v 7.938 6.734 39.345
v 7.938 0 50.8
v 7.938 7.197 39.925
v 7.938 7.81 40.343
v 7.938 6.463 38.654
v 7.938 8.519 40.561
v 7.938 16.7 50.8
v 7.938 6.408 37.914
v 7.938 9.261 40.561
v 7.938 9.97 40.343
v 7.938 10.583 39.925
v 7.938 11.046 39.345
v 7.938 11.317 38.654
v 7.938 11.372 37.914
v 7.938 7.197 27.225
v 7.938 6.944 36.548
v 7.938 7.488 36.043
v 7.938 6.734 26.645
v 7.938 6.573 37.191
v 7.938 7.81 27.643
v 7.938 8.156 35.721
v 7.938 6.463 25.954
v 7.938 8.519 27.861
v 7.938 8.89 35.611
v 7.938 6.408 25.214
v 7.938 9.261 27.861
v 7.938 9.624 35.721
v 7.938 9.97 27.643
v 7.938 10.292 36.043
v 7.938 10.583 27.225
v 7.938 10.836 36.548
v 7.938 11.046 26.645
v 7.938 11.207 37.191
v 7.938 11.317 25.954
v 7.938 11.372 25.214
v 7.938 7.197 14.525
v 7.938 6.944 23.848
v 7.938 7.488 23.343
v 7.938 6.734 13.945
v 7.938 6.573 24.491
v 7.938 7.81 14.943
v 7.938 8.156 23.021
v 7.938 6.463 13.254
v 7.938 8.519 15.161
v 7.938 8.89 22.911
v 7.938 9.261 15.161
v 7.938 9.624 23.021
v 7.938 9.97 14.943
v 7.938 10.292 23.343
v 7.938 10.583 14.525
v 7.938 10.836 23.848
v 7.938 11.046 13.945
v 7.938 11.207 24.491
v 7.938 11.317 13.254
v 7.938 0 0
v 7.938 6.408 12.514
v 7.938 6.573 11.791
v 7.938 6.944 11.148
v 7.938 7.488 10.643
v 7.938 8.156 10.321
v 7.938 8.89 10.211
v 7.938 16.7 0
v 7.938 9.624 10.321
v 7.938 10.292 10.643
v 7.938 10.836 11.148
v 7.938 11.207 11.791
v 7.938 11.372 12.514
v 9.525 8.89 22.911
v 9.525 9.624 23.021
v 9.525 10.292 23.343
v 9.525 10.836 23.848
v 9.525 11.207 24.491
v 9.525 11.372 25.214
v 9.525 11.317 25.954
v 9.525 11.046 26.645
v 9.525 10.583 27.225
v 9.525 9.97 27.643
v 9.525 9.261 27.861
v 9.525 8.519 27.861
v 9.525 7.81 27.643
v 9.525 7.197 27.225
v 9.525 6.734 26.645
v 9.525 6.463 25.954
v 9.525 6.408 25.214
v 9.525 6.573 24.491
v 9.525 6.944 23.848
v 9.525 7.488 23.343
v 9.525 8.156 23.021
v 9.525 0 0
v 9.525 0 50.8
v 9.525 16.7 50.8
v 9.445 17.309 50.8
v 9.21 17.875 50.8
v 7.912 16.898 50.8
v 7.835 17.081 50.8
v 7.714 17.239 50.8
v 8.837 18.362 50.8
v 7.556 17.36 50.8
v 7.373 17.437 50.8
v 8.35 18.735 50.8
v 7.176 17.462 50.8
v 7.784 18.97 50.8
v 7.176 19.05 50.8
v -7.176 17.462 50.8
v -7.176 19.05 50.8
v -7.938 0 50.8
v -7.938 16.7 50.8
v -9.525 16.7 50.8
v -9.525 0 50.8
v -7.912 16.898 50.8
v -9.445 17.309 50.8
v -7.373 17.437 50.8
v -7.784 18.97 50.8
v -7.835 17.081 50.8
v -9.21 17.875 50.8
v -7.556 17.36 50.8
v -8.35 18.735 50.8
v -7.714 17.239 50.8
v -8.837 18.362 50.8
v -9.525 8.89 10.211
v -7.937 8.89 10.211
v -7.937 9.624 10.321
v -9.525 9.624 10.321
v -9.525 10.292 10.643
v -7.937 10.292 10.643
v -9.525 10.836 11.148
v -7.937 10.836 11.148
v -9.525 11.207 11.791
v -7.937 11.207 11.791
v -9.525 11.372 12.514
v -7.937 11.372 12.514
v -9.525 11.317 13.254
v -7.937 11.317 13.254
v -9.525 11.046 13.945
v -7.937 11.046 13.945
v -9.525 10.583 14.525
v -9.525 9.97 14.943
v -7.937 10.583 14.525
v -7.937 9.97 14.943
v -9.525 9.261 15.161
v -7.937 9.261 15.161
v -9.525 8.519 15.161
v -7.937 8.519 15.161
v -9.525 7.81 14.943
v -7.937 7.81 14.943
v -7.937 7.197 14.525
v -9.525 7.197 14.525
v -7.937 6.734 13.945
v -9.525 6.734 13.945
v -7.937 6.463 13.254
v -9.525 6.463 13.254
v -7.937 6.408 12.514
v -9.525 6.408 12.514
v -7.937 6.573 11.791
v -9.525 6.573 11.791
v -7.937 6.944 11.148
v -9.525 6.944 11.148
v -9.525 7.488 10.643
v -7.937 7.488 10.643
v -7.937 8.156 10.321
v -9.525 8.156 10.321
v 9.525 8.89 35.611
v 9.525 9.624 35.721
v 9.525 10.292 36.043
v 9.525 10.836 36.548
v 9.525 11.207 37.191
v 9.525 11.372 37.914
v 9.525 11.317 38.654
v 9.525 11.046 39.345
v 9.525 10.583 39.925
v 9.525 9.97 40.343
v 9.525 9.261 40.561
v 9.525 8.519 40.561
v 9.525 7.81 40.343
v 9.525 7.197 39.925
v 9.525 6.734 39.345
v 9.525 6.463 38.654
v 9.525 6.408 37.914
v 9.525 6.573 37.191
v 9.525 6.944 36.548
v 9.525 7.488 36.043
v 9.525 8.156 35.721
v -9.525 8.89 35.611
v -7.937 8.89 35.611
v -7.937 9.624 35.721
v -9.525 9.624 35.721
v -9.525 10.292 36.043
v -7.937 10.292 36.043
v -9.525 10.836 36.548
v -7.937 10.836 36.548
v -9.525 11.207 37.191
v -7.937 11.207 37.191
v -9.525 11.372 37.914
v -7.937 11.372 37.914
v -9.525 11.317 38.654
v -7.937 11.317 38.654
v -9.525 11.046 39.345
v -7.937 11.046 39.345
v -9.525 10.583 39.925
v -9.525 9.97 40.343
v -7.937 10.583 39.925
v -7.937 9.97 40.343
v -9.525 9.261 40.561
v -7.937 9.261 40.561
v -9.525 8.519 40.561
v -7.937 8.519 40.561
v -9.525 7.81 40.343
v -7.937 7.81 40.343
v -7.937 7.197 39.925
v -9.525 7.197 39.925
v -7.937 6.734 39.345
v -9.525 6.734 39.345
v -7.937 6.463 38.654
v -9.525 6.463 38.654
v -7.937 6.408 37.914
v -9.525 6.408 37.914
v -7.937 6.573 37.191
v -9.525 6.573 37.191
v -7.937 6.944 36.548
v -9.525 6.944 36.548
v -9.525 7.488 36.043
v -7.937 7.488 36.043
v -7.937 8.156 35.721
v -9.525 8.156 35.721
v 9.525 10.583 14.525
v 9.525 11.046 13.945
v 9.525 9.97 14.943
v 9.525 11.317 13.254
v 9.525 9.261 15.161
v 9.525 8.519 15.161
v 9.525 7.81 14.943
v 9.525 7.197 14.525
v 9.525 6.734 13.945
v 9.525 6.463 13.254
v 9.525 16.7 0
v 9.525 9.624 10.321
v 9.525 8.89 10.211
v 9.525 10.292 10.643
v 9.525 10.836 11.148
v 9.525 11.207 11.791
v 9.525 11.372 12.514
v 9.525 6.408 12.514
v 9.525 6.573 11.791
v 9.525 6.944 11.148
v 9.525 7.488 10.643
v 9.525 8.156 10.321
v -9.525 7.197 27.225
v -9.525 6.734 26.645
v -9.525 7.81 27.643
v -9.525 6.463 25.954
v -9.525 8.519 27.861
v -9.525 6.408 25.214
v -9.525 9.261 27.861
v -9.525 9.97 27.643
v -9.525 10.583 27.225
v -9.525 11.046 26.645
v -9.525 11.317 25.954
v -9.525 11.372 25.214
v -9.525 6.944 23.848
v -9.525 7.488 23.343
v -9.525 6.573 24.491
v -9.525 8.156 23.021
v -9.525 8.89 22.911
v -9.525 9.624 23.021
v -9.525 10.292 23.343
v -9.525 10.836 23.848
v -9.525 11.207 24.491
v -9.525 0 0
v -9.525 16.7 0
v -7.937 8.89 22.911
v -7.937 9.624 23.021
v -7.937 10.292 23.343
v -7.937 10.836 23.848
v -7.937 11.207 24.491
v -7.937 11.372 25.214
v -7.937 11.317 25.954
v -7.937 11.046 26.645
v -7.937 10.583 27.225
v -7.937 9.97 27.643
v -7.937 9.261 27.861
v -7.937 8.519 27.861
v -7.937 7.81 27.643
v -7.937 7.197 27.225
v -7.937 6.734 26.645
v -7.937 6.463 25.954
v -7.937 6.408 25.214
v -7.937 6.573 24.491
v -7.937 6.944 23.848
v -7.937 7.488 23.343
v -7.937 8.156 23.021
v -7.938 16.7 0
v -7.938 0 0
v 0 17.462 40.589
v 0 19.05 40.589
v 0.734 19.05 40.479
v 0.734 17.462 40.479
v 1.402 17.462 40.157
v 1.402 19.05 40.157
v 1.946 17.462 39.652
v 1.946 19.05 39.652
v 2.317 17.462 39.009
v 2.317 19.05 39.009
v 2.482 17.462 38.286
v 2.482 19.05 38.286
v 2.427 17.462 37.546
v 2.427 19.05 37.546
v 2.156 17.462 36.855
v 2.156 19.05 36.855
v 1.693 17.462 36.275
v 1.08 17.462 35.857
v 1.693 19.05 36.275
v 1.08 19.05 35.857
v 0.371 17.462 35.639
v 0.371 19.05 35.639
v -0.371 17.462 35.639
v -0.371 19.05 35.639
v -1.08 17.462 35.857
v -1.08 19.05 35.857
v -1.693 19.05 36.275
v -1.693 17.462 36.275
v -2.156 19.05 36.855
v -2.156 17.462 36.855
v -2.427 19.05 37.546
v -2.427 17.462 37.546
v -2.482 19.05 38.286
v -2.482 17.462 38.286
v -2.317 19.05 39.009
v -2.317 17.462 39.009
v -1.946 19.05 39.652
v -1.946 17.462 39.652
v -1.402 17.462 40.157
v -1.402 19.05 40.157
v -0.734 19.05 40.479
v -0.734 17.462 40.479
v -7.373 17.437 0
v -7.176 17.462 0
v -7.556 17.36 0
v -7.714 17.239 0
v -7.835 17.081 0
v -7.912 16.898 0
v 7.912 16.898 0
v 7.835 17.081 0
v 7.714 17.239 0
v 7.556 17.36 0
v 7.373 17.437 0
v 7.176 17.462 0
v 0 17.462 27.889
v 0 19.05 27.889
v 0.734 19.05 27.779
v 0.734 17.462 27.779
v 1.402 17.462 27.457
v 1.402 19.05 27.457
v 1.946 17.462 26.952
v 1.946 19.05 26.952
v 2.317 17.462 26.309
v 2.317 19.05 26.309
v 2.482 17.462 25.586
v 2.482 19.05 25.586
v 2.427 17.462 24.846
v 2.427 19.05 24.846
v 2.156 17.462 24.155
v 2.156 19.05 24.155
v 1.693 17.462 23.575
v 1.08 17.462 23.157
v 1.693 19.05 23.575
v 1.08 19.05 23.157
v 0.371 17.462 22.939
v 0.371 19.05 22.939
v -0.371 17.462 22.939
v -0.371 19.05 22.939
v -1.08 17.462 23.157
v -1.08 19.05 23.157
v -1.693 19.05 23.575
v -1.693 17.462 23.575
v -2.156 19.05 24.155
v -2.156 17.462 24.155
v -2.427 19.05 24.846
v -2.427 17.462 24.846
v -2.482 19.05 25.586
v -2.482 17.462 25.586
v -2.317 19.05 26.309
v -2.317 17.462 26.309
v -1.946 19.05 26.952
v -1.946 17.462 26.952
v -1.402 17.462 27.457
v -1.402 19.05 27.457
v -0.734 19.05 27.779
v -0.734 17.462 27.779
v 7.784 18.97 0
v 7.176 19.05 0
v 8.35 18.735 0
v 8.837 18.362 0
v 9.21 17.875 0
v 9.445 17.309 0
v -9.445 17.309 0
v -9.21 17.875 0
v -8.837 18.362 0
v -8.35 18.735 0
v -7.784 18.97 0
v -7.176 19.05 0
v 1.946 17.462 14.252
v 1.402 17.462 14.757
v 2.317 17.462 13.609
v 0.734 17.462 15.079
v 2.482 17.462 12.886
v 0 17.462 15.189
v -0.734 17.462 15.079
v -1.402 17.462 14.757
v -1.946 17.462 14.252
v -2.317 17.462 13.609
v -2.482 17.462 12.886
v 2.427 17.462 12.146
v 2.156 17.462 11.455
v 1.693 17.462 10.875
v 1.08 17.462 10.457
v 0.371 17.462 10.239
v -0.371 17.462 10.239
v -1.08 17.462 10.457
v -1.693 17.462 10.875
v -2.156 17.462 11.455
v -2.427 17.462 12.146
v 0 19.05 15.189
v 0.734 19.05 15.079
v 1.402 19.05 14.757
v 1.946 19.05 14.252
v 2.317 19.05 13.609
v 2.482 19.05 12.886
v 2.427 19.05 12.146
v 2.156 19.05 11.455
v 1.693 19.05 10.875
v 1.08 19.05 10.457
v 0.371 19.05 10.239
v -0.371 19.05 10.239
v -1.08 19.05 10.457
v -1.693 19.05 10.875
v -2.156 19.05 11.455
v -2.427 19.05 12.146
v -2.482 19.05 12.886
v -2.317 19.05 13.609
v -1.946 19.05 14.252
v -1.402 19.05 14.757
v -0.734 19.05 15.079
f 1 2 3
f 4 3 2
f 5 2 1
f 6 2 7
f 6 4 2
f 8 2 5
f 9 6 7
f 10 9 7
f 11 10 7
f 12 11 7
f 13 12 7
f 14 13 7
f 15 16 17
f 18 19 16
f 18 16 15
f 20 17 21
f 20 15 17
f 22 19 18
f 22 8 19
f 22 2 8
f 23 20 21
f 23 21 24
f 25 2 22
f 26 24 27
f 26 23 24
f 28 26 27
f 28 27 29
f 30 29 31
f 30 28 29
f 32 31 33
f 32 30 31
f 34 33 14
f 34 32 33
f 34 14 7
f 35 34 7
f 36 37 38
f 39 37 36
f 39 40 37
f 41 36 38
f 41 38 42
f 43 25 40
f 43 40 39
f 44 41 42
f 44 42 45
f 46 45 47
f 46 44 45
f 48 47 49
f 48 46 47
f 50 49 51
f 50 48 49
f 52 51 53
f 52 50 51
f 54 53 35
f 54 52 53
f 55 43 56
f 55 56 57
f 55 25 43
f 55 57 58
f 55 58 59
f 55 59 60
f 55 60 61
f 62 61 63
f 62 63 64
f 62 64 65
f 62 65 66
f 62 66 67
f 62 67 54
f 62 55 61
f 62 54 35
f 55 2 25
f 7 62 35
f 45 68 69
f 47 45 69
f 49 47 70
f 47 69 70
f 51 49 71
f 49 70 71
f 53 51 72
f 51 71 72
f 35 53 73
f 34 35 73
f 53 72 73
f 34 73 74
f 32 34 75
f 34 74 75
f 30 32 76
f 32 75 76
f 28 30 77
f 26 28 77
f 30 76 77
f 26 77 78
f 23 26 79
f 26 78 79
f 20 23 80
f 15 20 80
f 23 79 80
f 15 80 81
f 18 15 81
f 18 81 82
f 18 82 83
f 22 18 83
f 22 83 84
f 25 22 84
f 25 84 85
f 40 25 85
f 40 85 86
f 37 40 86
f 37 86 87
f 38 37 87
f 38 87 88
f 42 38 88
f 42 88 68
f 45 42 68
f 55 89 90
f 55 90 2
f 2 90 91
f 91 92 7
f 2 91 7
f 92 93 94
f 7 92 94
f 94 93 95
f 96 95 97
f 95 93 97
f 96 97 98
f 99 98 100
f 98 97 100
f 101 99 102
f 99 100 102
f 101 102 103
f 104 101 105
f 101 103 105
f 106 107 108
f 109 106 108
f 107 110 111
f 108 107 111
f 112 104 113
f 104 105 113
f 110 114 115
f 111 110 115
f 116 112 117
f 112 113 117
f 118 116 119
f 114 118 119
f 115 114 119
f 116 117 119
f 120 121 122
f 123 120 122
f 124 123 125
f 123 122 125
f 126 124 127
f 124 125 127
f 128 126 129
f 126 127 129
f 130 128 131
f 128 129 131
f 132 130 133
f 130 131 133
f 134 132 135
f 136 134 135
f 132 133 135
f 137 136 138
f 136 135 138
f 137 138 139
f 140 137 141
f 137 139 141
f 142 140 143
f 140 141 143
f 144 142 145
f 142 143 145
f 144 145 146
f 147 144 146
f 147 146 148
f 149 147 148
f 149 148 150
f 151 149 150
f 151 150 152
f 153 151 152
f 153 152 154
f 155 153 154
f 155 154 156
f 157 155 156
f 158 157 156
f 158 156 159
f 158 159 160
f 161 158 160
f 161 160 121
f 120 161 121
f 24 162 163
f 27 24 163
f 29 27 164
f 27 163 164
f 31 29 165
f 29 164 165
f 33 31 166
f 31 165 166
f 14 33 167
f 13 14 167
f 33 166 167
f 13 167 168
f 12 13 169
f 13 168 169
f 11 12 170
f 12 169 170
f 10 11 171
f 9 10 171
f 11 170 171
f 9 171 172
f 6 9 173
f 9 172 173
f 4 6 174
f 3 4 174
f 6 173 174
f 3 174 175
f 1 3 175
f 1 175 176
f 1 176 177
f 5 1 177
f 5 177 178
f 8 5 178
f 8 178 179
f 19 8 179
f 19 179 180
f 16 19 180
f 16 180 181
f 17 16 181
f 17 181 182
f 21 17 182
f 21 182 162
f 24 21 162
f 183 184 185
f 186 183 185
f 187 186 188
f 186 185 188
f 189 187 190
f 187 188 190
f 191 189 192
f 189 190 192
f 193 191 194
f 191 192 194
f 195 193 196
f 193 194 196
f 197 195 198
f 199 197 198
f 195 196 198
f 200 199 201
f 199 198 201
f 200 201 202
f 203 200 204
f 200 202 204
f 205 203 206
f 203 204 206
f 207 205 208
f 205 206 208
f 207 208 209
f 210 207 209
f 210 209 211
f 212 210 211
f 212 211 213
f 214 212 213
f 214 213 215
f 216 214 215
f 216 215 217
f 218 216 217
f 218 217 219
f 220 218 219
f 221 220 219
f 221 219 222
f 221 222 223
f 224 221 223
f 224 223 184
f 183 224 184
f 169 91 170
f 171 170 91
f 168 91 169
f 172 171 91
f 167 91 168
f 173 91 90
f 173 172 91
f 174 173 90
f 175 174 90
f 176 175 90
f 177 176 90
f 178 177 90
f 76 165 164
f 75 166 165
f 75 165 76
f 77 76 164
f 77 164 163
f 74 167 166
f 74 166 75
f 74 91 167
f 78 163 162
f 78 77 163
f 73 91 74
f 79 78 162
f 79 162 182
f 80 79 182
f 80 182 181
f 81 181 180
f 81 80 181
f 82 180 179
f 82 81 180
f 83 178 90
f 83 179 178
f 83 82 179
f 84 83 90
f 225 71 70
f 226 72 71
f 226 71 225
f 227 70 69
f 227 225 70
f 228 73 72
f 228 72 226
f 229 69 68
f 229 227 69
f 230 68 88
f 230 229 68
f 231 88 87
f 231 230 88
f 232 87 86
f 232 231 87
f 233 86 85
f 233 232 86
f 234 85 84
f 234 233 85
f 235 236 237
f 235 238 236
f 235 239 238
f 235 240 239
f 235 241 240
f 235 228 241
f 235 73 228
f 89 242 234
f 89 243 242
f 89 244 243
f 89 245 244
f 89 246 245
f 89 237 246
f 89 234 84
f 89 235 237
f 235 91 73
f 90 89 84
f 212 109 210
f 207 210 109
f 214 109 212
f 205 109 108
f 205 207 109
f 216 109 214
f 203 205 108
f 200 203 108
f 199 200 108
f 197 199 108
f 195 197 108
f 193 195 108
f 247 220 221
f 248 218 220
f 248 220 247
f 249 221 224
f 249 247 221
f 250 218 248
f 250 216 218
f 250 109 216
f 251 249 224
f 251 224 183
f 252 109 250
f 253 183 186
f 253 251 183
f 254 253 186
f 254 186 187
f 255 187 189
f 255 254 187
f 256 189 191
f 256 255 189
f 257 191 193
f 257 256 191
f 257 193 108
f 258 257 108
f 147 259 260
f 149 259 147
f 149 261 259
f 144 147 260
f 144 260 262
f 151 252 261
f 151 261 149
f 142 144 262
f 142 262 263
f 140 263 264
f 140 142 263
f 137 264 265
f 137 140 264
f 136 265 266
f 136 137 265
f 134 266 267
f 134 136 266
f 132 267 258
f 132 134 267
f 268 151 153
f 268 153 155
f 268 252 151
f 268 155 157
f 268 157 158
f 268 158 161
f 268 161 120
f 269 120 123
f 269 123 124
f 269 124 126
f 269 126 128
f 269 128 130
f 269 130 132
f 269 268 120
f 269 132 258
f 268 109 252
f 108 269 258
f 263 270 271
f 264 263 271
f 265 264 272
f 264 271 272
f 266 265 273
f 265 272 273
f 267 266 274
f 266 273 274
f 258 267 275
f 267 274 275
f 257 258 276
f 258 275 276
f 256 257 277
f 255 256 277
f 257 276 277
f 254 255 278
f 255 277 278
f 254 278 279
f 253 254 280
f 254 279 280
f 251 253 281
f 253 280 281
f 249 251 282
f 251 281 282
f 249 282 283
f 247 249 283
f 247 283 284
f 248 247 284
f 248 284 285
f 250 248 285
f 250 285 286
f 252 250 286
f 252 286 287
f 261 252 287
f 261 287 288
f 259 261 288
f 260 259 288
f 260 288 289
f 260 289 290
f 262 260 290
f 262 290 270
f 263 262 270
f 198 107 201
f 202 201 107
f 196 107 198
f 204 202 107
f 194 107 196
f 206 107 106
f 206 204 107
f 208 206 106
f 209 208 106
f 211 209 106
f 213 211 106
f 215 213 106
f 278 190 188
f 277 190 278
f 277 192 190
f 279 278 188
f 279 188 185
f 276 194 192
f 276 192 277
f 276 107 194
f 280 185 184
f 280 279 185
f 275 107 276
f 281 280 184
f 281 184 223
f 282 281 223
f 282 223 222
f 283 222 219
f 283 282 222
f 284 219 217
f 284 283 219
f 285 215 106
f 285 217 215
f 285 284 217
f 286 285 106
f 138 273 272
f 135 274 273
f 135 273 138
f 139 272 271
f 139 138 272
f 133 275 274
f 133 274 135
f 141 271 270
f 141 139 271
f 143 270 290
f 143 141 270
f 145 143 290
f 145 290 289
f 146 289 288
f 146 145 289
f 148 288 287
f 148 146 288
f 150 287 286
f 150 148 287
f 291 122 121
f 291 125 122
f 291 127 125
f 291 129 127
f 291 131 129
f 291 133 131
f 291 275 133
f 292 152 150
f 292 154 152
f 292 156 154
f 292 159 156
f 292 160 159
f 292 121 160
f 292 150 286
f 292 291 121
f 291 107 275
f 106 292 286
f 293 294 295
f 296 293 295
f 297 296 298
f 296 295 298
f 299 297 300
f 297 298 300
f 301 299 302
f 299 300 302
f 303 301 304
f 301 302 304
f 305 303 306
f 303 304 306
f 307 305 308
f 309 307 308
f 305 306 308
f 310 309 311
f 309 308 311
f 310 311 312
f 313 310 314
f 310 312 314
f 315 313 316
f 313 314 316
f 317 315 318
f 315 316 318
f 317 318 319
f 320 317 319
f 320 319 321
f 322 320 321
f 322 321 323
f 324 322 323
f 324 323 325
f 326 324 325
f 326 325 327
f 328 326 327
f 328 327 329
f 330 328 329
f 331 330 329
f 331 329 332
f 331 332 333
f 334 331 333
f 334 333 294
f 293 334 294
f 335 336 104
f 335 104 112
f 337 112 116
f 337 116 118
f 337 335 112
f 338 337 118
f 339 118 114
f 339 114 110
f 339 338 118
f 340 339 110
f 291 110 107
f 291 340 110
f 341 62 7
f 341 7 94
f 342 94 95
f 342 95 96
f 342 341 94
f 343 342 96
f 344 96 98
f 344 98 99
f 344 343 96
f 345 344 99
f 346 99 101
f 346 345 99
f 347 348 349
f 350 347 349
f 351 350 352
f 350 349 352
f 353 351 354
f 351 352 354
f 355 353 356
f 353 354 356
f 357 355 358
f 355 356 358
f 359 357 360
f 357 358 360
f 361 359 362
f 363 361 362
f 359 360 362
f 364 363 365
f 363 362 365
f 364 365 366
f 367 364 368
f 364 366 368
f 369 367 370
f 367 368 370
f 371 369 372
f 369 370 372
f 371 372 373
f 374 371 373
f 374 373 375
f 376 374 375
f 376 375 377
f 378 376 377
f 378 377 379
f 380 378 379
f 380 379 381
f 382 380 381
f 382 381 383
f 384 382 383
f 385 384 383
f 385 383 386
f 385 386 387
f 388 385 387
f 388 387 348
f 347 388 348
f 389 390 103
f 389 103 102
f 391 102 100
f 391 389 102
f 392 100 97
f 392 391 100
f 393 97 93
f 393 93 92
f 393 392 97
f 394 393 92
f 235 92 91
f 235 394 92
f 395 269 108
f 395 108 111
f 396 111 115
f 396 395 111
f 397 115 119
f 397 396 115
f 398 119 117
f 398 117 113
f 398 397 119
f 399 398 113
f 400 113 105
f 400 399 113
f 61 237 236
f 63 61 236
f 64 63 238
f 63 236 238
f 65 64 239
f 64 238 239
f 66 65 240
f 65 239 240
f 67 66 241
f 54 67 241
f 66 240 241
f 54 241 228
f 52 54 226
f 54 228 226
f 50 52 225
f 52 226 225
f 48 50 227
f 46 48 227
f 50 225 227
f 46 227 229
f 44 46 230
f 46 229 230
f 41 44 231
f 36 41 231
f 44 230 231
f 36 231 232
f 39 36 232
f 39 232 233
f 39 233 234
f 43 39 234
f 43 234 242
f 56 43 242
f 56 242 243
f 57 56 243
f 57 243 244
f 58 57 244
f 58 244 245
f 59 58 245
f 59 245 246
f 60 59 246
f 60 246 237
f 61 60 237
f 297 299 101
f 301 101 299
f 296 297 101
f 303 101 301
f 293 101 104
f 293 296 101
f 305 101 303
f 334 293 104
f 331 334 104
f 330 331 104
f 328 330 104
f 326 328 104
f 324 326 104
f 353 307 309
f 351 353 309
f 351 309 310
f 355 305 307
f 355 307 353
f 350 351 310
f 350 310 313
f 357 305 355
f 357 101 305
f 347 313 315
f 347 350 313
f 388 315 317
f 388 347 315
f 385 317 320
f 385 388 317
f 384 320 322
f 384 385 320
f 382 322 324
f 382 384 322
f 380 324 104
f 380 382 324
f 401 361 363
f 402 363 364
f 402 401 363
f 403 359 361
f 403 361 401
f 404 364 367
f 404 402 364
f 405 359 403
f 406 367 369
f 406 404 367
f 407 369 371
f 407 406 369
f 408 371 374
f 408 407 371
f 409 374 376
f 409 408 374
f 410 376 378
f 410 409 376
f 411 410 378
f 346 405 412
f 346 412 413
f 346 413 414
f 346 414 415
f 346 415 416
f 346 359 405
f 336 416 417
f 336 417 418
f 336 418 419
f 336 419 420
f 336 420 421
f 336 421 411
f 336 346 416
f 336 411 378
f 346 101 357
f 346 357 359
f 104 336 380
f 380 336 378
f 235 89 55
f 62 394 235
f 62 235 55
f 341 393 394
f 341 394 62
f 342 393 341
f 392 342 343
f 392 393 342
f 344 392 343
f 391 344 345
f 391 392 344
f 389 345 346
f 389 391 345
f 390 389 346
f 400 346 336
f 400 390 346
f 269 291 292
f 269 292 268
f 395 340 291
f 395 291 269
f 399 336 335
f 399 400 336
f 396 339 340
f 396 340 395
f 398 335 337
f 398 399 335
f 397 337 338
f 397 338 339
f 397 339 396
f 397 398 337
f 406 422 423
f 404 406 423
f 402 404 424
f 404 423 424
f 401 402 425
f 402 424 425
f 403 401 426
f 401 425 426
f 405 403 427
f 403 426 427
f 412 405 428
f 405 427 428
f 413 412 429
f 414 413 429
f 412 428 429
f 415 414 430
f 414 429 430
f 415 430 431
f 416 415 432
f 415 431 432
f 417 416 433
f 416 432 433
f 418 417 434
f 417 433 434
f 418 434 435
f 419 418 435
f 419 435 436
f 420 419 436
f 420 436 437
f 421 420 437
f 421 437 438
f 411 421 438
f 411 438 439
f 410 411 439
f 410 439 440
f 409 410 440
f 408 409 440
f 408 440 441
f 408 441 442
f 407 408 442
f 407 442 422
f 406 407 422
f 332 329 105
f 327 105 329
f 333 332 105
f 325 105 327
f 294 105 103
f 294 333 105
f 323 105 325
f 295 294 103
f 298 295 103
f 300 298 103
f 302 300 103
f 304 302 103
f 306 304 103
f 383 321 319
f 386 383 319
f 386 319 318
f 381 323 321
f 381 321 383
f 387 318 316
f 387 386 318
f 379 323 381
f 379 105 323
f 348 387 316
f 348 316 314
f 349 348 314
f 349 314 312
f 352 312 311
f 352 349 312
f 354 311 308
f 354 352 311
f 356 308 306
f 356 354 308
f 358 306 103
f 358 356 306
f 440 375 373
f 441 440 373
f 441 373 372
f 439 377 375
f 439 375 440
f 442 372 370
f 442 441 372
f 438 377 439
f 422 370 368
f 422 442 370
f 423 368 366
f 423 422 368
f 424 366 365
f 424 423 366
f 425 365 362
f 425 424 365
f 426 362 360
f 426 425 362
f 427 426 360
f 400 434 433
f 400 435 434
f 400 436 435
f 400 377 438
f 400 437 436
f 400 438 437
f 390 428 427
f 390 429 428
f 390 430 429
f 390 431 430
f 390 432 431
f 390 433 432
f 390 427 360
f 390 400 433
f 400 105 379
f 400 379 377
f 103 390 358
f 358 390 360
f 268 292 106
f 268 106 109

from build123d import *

# Parameters (mm, degrees)
BASE_FLANGE1_DEPTH = 50.8
SKETCH6_R          = 2.4892
CUT_EXTRUDE1_DEPTH = 56.084191244
SKETCH7_R          = 2.4892
CUT_EXTRUDE2_DEPTH = 58.501695627


# Sheet-metal steps are written as plain solids
with BuildPart() as part:
    # Sketch1 → Base-Flange1 (new body)
    with BuildSketch(Plane.XY):
        with BuildLine():
            Line((-9.525, 0), (-9.525, 16.7005))
            ThreePointArc((-9.525, 16.7005), (-8.836847382, 18.361847382), (-7.1755, 19.05))
            Line((-7.1755, 19.05), (7.1755, 19.05))
            ThreePointArc((7.1755, 19.05), (8.836847382, 18.361847382), (9.525, 16.7005))
            Line((9.525, 16.7005), (9.525, 0))
            Line((9.525, 0), (7.9375, 0))
            Line((7.9375, 0), (7.9375, 16.7005))
            ThreePointArc((7.9375, 16.7005), (7.714315367, 17.239315367), (7.1755, 17.4625))
            Line((7.1755, 17.4625), (-7.1755, 17.4625))
            ThreePointArc((-7.1755, 17.4625), (-7.714315367, 17.239315367), (-7.9375, 16.7005))
            Line((-7.9375, 16.7005), (-7.9375, 0))
            Line((-7.9375, 0), (-9.525, 0))
        make_face()
    extrude(amount=BASE_FLANGE1_DEPTH)

    # Sketch6 → Cut-Extrude1 (cut, through all)
    with BuildSketch(Plane(origin=(0, 19.05, 0), x_dir=(1, 0, 0), z_dir=(0, 1, 0))):
        with Locations(Location((0, -12.7, 0), (0, 0, 270))):
            Circle(SKETCH6_R)
        with Locations(Location((0, -25.4, 0), (0, 0, 270))):
            Circle(SKETCH6_R)
        with Locations(Location((0, -38.1, 0), (0, 0, 270))):
            Circle(SKETCH6_R)
    extrude(amount=-CUT_EXTRUDE1_DEPTH, mode=Mode.SUBTRACT)

    # Sketch7 → Cut-Extrude2 (cut, through all)
    with BuildSketch(Plane(origin=(9.525, 0, 0), x_dir=(0, 0, -1), z_dir=(1, 0, 0))):
        with Locations((-25.4, 8.89)):
            Circle(SKETCH7_R)
        with Locations((-12.7, 8.89)):
            Circle(SKETCH7_R)
        with Locations((-38.1, 8.89)):
            Circle(SKETCH7_R)
    extrude(amount=-CUT_EXTRUDE2_DEPTH, mode=Mode.SUBTRACT)


solid = part.part
